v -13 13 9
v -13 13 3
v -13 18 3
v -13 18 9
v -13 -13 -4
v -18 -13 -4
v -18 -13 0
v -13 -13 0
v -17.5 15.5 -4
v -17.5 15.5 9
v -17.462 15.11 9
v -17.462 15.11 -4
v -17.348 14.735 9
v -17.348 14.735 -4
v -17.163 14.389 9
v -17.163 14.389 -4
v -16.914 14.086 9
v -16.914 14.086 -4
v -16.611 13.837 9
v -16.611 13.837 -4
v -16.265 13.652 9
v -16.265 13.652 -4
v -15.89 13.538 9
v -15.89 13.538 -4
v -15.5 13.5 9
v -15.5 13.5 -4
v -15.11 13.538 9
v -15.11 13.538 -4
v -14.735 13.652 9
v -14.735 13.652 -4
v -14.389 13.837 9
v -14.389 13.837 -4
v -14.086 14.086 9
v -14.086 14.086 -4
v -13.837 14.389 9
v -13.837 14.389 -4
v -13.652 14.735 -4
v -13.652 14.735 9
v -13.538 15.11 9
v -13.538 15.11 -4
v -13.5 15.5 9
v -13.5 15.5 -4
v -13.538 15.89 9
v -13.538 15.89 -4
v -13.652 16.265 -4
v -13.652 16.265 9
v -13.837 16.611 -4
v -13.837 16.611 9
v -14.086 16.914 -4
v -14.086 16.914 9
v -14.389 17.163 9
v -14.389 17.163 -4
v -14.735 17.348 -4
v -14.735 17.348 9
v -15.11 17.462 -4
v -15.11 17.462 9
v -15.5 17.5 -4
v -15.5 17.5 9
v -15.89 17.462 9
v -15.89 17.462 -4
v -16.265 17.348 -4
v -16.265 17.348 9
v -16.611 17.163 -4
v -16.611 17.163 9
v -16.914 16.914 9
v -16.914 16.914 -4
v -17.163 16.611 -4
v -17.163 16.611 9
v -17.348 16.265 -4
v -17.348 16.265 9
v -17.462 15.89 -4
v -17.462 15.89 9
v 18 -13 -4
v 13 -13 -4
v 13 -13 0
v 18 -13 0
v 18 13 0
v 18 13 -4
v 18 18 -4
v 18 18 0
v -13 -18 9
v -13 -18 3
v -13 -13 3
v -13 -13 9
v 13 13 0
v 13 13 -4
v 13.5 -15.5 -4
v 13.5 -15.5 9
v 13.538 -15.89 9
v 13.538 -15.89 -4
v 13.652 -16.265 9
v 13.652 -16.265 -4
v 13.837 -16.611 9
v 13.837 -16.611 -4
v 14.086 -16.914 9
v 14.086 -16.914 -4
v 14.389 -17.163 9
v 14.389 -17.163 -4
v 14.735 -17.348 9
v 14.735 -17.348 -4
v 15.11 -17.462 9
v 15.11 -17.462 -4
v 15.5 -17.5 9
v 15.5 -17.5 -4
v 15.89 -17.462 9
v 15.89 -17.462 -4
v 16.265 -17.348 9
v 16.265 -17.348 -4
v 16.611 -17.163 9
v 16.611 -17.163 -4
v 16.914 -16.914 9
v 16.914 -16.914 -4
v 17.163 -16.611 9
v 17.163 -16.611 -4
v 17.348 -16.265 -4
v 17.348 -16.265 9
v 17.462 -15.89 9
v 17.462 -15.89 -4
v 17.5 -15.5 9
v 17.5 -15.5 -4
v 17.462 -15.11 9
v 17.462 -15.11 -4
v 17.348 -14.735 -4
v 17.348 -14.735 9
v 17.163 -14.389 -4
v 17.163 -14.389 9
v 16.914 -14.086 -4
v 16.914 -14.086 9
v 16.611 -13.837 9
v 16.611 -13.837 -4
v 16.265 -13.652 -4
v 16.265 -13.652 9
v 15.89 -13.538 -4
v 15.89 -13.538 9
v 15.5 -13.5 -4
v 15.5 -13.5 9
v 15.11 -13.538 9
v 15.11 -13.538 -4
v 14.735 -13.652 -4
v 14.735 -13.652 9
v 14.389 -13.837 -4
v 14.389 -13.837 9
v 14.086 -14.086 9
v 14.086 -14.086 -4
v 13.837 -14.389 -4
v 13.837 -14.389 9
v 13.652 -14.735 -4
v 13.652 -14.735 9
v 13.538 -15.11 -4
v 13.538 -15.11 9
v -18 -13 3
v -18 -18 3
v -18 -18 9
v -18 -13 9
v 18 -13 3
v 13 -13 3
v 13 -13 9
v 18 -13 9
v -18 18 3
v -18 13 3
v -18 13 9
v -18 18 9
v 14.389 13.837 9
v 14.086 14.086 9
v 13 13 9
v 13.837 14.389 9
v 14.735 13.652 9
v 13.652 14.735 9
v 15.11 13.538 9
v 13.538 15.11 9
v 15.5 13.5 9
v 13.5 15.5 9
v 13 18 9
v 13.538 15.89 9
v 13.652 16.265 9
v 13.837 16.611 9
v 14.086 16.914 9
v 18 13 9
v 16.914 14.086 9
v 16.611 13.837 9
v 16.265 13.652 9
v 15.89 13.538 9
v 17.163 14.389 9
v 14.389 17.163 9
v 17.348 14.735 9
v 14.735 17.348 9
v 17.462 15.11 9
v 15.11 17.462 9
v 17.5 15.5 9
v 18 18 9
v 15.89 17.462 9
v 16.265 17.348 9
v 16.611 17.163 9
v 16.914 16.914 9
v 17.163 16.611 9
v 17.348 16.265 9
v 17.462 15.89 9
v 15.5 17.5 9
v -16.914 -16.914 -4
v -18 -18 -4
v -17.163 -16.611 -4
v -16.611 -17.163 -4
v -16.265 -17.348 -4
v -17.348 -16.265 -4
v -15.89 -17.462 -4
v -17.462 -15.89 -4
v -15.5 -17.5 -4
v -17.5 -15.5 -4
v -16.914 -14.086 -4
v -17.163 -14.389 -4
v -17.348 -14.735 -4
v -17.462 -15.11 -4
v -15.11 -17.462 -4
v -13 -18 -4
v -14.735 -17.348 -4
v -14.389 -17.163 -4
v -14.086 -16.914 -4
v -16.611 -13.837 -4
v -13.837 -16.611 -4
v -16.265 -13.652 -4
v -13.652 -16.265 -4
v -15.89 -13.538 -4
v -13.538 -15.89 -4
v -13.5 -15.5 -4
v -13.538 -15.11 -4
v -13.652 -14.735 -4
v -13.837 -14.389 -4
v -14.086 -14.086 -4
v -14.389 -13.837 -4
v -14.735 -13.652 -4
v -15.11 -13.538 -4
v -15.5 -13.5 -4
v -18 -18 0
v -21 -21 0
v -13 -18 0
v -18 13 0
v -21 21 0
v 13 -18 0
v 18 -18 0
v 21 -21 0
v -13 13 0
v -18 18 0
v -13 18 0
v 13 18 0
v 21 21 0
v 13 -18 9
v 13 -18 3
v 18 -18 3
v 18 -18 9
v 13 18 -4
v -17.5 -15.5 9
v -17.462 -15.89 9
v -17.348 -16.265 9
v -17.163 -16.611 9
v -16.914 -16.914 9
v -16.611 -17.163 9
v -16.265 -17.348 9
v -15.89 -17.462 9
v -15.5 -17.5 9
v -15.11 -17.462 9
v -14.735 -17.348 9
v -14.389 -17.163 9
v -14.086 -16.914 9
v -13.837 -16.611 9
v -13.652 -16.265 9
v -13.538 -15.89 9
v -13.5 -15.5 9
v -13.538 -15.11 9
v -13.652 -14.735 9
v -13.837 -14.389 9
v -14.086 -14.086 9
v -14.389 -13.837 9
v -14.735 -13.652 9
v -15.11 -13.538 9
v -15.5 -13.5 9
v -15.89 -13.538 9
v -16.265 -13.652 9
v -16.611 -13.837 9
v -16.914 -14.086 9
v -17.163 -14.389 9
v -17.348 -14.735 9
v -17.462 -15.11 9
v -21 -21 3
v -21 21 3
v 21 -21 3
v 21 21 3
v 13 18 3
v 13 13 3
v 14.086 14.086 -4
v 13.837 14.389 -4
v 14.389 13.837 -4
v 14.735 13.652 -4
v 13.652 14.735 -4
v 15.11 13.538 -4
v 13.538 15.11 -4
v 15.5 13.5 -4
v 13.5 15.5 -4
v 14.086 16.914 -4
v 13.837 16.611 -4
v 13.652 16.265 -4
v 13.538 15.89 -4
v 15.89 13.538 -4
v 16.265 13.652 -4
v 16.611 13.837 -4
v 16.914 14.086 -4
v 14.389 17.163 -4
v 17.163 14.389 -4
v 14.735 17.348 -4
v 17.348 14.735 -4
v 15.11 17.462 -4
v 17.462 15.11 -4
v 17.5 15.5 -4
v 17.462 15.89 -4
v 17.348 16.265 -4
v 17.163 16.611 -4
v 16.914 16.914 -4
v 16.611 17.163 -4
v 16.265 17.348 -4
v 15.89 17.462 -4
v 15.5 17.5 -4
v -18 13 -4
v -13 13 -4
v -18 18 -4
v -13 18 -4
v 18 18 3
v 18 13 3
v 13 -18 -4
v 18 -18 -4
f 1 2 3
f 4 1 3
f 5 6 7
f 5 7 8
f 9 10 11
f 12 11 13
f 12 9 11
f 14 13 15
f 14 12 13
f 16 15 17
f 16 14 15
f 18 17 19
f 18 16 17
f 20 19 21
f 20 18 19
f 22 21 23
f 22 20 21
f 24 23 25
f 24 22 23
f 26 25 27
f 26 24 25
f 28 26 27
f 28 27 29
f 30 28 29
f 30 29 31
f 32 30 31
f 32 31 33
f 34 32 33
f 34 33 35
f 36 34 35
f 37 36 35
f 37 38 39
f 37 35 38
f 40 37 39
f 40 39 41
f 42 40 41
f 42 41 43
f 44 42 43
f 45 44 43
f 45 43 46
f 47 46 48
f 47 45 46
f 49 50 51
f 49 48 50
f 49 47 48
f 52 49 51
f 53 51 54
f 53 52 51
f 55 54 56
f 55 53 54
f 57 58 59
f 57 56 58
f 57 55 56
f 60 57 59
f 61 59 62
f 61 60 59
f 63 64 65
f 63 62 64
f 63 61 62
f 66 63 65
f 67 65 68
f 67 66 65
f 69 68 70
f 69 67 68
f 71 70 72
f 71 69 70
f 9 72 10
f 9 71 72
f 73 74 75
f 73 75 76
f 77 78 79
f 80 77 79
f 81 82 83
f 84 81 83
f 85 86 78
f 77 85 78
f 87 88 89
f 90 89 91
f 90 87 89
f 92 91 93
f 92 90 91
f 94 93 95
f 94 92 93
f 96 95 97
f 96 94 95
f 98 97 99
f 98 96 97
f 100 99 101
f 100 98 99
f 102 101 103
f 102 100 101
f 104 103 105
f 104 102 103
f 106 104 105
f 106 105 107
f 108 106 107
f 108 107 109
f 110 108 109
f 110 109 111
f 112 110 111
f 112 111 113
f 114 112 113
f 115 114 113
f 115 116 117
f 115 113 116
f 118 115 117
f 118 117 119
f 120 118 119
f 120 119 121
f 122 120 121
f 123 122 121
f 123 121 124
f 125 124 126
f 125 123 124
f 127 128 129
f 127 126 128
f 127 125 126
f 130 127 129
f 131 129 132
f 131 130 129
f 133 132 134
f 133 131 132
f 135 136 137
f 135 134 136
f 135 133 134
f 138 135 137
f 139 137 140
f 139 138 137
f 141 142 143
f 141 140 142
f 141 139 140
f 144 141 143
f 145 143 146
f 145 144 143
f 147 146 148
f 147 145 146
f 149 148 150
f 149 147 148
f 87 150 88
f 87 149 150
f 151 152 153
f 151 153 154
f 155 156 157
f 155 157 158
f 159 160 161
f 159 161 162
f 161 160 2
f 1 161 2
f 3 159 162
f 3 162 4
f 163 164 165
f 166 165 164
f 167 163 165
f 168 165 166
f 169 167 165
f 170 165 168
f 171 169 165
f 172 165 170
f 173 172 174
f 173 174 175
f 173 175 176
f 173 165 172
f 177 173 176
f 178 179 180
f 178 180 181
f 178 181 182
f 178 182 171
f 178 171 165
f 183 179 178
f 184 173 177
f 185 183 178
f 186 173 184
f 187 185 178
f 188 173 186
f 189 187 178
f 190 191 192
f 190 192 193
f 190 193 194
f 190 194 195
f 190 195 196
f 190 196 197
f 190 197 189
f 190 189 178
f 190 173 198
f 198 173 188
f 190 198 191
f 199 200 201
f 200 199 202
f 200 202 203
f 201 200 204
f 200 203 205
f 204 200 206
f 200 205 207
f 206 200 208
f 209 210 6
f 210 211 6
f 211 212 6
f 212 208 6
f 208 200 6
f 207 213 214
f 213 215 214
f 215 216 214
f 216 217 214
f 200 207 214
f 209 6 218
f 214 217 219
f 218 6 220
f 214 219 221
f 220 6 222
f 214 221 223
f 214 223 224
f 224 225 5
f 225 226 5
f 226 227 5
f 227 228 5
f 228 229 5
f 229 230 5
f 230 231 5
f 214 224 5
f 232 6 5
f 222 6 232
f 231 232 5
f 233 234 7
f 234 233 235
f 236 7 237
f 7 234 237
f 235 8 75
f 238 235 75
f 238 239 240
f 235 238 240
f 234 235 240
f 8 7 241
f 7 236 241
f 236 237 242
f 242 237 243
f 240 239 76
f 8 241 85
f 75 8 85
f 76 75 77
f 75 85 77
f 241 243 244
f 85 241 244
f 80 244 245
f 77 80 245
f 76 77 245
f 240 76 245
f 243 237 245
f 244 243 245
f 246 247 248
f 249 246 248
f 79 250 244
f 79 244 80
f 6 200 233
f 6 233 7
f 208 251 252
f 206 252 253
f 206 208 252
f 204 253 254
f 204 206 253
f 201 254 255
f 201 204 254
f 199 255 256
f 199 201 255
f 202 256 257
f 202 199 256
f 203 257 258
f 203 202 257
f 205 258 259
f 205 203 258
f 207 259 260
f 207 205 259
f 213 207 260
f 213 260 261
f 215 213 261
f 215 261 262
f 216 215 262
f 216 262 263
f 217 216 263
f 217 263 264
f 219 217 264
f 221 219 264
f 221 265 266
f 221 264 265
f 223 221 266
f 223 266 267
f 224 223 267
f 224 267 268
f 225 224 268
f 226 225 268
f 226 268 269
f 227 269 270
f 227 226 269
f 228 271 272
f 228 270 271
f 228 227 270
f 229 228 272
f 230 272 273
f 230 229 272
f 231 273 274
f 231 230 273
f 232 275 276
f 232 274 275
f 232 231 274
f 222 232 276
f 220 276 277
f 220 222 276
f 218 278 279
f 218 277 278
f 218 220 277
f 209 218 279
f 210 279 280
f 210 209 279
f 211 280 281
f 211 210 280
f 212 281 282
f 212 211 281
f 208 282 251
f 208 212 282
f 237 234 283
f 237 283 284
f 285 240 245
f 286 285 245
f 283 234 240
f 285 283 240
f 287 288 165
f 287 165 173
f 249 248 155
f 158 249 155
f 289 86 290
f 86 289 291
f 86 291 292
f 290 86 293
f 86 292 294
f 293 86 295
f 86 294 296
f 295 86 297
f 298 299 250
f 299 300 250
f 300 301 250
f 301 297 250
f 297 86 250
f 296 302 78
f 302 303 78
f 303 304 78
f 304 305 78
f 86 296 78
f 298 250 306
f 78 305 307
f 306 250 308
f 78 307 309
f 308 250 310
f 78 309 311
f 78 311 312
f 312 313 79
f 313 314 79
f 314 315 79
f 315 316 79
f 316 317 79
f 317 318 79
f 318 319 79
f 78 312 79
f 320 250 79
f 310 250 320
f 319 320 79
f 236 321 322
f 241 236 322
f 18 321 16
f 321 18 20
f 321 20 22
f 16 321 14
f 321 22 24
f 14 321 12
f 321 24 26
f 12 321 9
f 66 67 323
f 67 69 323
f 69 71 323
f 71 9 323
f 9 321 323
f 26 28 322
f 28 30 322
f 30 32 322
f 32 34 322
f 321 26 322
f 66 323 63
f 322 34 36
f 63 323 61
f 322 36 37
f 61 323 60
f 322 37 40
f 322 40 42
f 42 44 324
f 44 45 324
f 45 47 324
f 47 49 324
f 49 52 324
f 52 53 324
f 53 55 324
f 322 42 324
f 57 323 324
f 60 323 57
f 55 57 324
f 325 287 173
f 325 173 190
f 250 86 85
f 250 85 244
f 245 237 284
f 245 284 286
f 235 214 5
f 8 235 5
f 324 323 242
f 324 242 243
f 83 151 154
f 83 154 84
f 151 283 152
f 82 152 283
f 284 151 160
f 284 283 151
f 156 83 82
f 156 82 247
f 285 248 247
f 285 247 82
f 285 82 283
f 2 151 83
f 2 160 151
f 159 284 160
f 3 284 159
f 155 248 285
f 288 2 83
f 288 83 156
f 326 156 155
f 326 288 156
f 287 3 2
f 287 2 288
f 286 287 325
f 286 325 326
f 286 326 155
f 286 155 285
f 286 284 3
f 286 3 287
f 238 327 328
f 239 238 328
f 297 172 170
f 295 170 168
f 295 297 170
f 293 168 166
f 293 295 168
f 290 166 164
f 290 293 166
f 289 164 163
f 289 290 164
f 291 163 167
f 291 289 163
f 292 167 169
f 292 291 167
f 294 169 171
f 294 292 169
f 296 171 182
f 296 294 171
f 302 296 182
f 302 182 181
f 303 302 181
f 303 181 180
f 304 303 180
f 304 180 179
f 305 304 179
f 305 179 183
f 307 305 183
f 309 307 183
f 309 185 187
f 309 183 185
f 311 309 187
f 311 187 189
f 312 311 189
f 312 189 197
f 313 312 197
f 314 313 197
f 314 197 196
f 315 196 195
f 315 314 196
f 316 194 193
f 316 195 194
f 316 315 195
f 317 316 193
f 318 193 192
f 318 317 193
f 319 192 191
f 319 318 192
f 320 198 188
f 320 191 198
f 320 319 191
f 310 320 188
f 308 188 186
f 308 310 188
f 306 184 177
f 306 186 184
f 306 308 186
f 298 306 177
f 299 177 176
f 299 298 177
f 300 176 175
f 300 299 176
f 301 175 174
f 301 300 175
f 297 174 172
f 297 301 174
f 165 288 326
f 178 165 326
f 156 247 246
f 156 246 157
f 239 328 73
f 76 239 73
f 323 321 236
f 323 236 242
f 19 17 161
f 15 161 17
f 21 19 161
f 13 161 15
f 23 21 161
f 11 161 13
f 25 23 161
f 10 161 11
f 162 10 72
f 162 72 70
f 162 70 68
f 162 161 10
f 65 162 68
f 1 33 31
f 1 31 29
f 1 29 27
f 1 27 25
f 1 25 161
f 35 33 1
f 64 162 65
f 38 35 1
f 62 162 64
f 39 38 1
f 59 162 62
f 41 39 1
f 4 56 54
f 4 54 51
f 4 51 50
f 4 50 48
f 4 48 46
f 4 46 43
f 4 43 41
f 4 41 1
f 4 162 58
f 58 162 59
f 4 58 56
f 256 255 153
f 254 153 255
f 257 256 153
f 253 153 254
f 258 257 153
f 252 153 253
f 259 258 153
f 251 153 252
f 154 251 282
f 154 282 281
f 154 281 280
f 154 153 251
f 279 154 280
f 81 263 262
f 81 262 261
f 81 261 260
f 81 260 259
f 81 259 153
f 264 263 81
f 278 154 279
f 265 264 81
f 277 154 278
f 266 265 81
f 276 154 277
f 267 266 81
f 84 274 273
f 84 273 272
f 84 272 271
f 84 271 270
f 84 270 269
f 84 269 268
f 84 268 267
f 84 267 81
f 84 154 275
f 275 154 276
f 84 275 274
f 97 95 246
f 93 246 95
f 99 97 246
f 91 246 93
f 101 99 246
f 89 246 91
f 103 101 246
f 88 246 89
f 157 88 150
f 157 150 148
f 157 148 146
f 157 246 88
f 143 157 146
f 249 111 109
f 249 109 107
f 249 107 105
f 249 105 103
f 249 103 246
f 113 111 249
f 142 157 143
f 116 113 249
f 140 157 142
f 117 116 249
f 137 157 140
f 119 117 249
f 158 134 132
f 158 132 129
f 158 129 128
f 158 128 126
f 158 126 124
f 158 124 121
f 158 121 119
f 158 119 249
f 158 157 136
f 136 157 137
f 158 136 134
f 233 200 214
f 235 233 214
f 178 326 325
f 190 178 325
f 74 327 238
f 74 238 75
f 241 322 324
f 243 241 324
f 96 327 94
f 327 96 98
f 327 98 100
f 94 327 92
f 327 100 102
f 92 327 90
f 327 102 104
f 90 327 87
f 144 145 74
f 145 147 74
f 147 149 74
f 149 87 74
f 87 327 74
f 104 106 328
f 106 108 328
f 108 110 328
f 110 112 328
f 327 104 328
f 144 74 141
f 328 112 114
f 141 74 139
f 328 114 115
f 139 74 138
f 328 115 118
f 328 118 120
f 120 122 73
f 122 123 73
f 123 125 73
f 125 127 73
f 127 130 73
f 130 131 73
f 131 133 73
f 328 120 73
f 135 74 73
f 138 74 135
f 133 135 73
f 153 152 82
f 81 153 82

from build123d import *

# Parameters (mm, degrees)
SKETCH2_W               = 42
SKETCH2_H               = 42
BOSS_EXTRUDE1_DEPTH     = 3
BOSS_EXTRUDE9_START     = 3
SKETCH2_5_W             = 5
SKETCH2_5_H             = 5
BOSS_EXTRUDE9_DEPTH     = 6
CUT_EXTRUDE3_DEPTH      = 32.032241298
CUT_EXTRUDE3_DEPTH_BACK = 32.032241298
SKETCH2_7_R             = 2
BOSS_EXTRUDE10_START    = -4
SKETCH2_6_W             = 5
SKETCH2_6_H             = 5
SKETCH2_6_R             = 2
BOSS_EXTRUDE10_DEPTH    = 4


with BuildPart() as part:
    # Sketch2 → Boss-Extrude1 (new body)
    with BuildSketch(Plane.XY):
        Rectangle(SKETCH2_W, SKETCH2_H)
    extrude(amount=BOSS_EXTRUDE1_DEPTH)

    # Sketch2<5> → Boss-Extrude9 (add)
    with BuildSketch(Plane.XY.offset(BOSS_EXTRUDE9_START)):
        with Locations((-15.5, 15.5)):
            Rectangle(SKETCH2_5_W, SKETCH2_5_H)
        with Locations((15.5, 15.5)):
            Rectangle(SKETCH2_5_W, SKETCH2_5_H)
        with Locations((15.5, -15.5)):
            Rectangle(SKETCH2_5_W, SKETCH2_5_H)
        with Locations((-15.5, -15.5)):
            Rectangle(SKETCH2_5_W, SKETCH2_5_H)
    extrude(amount=BOSS_EXTRUDE9_DEPTH)

    # Sketch2<7> → Cut-Extrude3 (cut, two sides: drawn at the far end of the back side and taken through both)
    with BuildSketch(Plane.XY.offset(-CUT_EXTRUDE3_DEPTH_BACK)):
        with Locations(Location((-15.5, 15.5, 0), (0, 0, 180))):
            Circle(SKETCH2_7_R)
        with Locations(Location((15.5, 15.5, 0), (0, 0, 180))):
            Circle(SKETCH2_7_R)
        with Locations(Location((15.5, -15.5, 0), (0, 0, 180))):
            Circle(SKETCH2_7_R)
        with Locations(Location((-15.5, -15.5, 0), (0, 0, 180))):
            Circle(SKETCH2_7_R)
    extrude(amount=CUT_EXTRUDE3_DEPTH + CUT_EXTRUDE3_DEPTH_BACK, mode=Mode.SUBTRACT)

    # Sketch2<6> → Boss-Extrude10 (add)
    # profile 1 of 4: a face of its own
    with BuildSketch(Plane.XY.offset(BOSS_EXTRUDE10_START)):
        with Locations((-15.5, -15.5)):
            Rectangle(SKETCH2_6_W, SKETCH2_6_H)
        with Locations(Location((-15.5, -15.5, 0), (0, 0, 180))):
            Circle(SKETCH2_6_R, mode=Mode.SUBTRACT)
    # profile 2 of 4: a face of its own
    with BuildSketch(Plane.XY.offset(BOSS_EXTRUDE10_START)):
        with Locations((15.5, -15.5)):
            Rectangle(SKETCH2_6_W, SKETCH2_6_H)
        with Locations(Location((15.5, -15.5, 0), (0, 0, 180))):
            Circle(SKETCH2_6_R, mode=Mode.SUBTRACT)
    # profile 3 of 4: a face of its own
    with BuildSketch(Plane.XY.offset(BOSS_EXTRUDE10_START)):
        with Locations((15.5, 15.5)):
            Rectangle(SKETCH2_6_W, SKETCH2_6_H)
        with Locations(Location((15.5, 15.5, 0), (0, 0, 180))):
            Circle(SKETCH2_6_R, mode=Mode.SUBTRACT)
    # profile 4 of 4: a face of its own
    with BuildSketch(Plane.XY.offset(BOSS_EXTRUDE10_START)):
        with Locations((-15.5, 15.5)):
            Rectangle(SKETCH2_6_W, SKETCH2_6_H)
        with Locations(Location((-15.5, 15.5, 0), (0, 0, 180))):
            Circle(SKETCH2_6_R, mode=Mode.SUBTRACT)
    extrude(amount=BOSS_EXTRUDE10_DEPTH)


solid = part.part
